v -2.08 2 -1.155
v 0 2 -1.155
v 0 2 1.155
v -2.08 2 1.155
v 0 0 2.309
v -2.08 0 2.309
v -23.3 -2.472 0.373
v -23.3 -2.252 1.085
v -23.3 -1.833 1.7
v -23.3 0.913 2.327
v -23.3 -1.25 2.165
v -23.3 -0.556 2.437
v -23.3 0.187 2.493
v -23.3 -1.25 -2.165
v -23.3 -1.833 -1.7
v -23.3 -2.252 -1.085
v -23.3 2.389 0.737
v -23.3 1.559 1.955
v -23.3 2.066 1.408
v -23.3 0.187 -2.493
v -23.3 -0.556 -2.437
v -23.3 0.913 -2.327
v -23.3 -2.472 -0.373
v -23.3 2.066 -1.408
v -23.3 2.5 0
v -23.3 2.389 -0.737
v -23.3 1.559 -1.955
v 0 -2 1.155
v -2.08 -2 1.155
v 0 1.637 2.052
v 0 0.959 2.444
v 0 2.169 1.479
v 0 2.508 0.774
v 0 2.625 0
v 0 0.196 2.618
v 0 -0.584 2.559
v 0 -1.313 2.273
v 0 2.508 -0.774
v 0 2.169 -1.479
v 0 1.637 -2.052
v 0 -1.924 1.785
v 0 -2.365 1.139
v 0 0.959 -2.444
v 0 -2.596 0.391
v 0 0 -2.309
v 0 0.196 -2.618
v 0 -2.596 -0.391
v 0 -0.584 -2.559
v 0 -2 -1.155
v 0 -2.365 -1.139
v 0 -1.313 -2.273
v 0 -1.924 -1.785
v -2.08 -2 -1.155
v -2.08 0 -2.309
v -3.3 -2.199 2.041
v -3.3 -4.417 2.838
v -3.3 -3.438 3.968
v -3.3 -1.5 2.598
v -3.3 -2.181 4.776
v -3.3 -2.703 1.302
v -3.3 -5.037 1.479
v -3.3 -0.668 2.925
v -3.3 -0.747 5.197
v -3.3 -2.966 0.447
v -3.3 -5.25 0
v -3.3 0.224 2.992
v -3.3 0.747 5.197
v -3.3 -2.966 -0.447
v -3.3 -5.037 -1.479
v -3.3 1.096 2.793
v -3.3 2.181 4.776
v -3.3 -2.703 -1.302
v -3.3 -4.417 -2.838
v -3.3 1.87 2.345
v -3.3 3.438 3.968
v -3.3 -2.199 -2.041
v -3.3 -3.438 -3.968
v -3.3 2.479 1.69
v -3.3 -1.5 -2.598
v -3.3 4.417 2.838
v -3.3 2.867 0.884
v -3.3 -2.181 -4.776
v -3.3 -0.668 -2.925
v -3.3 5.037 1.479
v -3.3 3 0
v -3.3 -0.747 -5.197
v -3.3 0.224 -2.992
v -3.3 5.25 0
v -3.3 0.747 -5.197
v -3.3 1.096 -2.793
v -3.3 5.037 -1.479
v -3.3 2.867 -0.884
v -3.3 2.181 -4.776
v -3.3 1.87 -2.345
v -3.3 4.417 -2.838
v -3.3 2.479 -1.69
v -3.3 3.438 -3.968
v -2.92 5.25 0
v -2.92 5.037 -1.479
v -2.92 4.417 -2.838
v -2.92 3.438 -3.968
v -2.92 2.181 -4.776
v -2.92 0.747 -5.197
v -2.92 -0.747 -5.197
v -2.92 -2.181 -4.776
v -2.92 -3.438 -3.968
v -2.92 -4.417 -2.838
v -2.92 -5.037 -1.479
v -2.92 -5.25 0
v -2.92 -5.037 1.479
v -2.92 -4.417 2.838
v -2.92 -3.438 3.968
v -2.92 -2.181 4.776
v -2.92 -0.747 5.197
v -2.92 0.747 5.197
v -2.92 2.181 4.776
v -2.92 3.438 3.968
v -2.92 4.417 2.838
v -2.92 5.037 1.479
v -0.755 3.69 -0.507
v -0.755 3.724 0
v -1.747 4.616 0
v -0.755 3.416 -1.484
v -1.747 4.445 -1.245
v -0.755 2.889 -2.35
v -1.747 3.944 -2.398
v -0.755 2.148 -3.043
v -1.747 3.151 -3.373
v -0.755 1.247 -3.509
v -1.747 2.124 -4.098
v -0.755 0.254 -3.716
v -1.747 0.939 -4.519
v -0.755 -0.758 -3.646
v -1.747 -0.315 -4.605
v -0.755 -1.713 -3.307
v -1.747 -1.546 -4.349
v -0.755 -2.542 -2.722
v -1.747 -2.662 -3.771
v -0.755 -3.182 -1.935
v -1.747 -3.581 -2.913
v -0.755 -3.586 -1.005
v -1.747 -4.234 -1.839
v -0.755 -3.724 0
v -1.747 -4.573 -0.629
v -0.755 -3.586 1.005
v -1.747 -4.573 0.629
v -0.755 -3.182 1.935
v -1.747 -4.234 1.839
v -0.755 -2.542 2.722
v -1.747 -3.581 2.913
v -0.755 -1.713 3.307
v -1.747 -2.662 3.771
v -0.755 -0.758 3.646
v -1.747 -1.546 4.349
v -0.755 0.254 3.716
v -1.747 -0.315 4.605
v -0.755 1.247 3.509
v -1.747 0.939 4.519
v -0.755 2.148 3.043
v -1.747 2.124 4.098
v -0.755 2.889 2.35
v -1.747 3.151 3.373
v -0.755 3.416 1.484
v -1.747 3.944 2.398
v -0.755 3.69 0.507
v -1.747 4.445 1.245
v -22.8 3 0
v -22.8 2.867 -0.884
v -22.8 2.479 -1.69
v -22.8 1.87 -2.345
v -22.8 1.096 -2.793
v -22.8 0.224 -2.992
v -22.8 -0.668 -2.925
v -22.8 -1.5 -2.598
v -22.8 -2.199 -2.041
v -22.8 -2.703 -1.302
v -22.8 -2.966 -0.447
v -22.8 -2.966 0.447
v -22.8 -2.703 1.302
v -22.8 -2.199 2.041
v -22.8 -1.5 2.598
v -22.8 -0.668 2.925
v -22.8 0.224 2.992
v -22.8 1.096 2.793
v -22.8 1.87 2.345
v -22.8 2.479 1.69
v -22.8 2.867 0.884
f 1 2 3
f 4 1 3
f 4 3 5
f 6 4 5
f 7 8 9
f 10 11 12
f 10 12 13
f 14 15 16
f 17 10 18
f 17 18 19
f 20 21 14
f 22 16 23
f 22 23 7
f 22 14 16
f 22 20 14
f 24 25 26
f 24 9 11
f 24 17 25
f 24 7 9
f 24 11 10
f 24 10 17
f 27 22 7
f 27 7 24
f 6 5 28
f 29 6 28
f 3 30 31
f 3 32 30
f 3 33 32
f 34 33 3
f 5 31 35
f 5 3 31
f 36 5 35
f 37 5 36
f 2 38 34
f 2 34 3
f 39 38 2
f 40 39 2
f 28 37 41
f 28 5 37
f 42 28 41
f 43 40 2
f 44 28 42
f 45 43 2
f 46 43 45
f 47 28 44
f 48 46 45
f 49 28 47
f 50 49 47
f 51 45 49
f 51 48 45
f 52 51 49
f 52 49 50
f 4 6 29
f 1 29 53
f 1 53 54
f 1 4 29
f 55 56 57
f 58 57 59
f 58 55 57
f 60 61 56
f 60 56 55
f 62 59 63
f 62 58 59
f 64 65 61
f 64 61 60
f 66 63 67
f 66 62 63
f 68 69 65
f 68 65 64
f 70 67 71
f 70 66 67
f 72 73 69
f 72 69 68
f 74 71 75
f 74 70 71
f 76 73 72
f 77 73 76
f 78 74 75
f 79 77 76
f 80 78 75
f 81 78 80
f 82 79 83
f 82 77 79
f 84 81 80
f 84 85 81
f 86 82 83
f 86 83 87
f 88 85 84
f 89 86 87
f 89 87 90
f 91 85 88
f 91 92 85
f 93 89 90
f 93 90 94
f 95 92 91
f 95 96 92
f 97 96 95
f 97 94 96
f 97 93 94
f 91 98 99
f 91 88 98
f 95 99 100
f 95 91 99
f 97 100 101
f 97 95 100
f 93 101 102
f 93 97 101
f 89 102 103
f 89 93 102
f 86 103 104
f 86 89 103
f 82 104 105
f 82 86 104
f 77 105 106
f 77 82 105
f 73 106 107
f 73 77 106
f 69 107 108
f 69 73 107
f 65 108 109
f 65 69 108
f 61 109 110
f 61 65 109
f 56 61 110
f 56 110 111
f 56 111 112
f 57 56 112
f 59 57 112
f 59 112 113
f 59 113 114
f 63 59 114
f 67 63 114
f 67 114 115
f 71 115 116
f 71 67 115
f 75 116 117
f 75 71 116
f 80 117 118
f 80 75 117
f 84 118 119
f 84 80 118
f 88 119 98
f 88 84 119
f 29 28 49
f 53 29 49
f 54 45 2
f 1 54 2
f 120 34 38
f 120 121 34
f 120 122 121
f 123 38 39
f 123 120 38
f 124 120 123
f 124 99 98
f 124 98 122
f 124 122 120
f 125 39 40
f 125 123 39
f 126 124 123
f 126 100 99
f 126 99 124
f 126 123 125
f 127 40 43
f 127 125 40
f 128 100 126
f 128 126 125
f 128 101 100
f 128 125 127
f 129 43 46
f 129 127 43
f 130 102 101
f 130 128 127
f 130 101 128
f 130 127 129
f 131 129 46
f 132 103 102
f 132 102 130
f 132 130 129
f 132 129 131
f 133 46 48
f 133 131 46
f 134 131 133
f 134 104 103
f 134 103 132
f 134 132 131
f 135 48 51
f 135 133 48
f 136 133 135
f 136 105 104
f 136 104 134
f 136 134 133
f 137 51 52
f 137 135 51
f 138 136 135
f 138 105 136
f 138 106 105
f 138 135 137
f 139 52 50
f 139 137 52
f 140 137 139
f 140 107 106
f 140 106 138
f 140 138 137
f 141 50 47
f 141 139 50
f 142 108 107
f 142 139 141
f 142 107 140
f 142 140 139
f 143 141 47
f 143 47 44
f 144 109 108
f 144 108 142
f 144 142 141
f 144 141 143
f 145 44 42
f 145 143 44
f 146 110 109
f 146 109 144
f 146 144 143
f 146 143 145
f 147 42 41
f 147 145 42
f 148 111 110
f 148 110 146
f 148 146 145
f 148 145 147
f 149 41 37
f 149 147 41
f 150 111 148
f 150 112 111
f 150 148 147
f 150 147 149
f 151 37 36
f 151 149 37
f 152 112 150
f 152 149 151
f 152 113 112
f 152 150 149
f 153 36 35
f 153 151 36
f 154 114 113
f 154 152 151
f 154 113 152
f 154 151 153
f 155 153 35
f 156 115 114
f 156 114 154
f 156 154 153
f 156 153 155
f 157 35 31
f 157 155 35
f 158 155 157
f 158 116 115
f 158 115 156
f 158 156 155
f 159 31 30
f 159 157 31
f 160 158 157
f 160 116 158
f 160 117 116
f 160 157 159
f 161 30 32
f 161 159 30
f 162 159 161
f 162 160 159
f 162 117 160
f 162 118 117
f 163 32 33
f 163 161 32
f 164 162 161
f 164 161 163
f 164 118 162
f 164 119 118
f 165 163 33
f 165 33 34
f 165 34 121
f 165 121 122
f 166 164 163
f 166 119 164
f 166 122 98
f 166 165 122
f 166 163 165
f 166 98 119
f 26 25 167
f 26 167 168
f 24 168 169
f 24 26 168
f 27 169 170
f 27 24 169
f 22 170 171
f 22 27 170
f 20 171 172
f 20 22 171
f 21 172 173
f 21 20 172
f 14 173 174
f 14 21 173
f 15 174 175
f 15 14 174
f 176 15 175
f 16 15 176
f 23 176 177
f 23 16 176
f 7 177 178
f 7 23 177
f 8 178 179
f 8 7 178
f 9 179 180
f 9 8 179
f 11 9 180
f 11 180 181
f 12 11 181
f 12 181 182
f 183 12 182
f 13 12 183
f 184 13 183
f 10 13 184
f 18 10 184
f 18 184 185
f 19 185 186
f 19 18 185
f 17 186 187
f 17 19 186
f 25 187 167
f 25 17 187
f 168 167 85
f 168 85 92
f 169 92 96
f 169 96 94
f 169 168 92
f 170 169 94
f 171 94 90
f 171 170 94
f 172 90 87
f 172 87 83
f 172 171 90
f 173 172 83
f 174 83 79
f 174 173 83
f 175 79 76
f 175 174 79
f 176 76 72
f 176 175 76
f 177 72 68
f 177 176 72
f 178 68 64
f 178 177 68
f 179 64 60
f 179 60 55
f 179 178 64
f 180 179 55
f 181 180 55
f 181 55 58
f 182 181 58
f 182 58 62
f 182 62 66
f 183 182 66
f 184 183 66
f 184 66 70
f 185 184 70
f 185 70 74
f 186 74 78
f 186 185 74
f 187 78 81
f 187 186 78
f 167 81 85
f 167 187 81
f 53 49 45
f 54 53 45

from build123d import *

# Parameters (mm, degrees)
CUT_EXTRUDE1_DEPTH = 2.08
CHAMFER1_SIZE      = 0.5


with BuildPart() as part:
    # Sketch1 → Revolve1 (revolve)
    with BuildSketch(Plane.XY):
        with BuildLine():
            Line((0, 0), (0, 2.625))
            ThreePointArc((0, 2.625), (-1.224500646, 4.199464996), (-2.92, 5.25))
            Line((-2.92, 5.25), (-3.3, 5.25))
            Line((-3.3, 5.25), (-3.3, 3))
            Line((-3.3, 3), (-23.3, 3))
            Line((-23.3, 3), (-23.3, 0))
            Line((-23.3, 0), (0, 0))
        make_face()
    revolve(axis=Axis((0, 0, 0), (-1, 0, 0)))

    # Sketch2 → Cut-Extrude1 (cut)
    with BuildSketch(Plane(origin=(0, 0, 0), x_dir=(0, 0, -1), z_dir=(1, 0, 0))):
        Polygon((2.309401077, 0), (1.154700538, 2), (-1.154700538, 2), (-2.309401077, 0), (-1.154700538, -2), (1.154700538, -2), align=None)
    extrude(amount=-CUT_EXTRUDE1_DEPTH, mode=Mode.SUBTRACT)

    # Chamfer1
    chamfer1_edges = [part.edges().sort_by_distance(p)[0] for p in [
        (-23.3, -3, 0),
    ]]
    chamfer(chamfer1_edges, length=CHAMFER1_SIZE)


solid = part.part
